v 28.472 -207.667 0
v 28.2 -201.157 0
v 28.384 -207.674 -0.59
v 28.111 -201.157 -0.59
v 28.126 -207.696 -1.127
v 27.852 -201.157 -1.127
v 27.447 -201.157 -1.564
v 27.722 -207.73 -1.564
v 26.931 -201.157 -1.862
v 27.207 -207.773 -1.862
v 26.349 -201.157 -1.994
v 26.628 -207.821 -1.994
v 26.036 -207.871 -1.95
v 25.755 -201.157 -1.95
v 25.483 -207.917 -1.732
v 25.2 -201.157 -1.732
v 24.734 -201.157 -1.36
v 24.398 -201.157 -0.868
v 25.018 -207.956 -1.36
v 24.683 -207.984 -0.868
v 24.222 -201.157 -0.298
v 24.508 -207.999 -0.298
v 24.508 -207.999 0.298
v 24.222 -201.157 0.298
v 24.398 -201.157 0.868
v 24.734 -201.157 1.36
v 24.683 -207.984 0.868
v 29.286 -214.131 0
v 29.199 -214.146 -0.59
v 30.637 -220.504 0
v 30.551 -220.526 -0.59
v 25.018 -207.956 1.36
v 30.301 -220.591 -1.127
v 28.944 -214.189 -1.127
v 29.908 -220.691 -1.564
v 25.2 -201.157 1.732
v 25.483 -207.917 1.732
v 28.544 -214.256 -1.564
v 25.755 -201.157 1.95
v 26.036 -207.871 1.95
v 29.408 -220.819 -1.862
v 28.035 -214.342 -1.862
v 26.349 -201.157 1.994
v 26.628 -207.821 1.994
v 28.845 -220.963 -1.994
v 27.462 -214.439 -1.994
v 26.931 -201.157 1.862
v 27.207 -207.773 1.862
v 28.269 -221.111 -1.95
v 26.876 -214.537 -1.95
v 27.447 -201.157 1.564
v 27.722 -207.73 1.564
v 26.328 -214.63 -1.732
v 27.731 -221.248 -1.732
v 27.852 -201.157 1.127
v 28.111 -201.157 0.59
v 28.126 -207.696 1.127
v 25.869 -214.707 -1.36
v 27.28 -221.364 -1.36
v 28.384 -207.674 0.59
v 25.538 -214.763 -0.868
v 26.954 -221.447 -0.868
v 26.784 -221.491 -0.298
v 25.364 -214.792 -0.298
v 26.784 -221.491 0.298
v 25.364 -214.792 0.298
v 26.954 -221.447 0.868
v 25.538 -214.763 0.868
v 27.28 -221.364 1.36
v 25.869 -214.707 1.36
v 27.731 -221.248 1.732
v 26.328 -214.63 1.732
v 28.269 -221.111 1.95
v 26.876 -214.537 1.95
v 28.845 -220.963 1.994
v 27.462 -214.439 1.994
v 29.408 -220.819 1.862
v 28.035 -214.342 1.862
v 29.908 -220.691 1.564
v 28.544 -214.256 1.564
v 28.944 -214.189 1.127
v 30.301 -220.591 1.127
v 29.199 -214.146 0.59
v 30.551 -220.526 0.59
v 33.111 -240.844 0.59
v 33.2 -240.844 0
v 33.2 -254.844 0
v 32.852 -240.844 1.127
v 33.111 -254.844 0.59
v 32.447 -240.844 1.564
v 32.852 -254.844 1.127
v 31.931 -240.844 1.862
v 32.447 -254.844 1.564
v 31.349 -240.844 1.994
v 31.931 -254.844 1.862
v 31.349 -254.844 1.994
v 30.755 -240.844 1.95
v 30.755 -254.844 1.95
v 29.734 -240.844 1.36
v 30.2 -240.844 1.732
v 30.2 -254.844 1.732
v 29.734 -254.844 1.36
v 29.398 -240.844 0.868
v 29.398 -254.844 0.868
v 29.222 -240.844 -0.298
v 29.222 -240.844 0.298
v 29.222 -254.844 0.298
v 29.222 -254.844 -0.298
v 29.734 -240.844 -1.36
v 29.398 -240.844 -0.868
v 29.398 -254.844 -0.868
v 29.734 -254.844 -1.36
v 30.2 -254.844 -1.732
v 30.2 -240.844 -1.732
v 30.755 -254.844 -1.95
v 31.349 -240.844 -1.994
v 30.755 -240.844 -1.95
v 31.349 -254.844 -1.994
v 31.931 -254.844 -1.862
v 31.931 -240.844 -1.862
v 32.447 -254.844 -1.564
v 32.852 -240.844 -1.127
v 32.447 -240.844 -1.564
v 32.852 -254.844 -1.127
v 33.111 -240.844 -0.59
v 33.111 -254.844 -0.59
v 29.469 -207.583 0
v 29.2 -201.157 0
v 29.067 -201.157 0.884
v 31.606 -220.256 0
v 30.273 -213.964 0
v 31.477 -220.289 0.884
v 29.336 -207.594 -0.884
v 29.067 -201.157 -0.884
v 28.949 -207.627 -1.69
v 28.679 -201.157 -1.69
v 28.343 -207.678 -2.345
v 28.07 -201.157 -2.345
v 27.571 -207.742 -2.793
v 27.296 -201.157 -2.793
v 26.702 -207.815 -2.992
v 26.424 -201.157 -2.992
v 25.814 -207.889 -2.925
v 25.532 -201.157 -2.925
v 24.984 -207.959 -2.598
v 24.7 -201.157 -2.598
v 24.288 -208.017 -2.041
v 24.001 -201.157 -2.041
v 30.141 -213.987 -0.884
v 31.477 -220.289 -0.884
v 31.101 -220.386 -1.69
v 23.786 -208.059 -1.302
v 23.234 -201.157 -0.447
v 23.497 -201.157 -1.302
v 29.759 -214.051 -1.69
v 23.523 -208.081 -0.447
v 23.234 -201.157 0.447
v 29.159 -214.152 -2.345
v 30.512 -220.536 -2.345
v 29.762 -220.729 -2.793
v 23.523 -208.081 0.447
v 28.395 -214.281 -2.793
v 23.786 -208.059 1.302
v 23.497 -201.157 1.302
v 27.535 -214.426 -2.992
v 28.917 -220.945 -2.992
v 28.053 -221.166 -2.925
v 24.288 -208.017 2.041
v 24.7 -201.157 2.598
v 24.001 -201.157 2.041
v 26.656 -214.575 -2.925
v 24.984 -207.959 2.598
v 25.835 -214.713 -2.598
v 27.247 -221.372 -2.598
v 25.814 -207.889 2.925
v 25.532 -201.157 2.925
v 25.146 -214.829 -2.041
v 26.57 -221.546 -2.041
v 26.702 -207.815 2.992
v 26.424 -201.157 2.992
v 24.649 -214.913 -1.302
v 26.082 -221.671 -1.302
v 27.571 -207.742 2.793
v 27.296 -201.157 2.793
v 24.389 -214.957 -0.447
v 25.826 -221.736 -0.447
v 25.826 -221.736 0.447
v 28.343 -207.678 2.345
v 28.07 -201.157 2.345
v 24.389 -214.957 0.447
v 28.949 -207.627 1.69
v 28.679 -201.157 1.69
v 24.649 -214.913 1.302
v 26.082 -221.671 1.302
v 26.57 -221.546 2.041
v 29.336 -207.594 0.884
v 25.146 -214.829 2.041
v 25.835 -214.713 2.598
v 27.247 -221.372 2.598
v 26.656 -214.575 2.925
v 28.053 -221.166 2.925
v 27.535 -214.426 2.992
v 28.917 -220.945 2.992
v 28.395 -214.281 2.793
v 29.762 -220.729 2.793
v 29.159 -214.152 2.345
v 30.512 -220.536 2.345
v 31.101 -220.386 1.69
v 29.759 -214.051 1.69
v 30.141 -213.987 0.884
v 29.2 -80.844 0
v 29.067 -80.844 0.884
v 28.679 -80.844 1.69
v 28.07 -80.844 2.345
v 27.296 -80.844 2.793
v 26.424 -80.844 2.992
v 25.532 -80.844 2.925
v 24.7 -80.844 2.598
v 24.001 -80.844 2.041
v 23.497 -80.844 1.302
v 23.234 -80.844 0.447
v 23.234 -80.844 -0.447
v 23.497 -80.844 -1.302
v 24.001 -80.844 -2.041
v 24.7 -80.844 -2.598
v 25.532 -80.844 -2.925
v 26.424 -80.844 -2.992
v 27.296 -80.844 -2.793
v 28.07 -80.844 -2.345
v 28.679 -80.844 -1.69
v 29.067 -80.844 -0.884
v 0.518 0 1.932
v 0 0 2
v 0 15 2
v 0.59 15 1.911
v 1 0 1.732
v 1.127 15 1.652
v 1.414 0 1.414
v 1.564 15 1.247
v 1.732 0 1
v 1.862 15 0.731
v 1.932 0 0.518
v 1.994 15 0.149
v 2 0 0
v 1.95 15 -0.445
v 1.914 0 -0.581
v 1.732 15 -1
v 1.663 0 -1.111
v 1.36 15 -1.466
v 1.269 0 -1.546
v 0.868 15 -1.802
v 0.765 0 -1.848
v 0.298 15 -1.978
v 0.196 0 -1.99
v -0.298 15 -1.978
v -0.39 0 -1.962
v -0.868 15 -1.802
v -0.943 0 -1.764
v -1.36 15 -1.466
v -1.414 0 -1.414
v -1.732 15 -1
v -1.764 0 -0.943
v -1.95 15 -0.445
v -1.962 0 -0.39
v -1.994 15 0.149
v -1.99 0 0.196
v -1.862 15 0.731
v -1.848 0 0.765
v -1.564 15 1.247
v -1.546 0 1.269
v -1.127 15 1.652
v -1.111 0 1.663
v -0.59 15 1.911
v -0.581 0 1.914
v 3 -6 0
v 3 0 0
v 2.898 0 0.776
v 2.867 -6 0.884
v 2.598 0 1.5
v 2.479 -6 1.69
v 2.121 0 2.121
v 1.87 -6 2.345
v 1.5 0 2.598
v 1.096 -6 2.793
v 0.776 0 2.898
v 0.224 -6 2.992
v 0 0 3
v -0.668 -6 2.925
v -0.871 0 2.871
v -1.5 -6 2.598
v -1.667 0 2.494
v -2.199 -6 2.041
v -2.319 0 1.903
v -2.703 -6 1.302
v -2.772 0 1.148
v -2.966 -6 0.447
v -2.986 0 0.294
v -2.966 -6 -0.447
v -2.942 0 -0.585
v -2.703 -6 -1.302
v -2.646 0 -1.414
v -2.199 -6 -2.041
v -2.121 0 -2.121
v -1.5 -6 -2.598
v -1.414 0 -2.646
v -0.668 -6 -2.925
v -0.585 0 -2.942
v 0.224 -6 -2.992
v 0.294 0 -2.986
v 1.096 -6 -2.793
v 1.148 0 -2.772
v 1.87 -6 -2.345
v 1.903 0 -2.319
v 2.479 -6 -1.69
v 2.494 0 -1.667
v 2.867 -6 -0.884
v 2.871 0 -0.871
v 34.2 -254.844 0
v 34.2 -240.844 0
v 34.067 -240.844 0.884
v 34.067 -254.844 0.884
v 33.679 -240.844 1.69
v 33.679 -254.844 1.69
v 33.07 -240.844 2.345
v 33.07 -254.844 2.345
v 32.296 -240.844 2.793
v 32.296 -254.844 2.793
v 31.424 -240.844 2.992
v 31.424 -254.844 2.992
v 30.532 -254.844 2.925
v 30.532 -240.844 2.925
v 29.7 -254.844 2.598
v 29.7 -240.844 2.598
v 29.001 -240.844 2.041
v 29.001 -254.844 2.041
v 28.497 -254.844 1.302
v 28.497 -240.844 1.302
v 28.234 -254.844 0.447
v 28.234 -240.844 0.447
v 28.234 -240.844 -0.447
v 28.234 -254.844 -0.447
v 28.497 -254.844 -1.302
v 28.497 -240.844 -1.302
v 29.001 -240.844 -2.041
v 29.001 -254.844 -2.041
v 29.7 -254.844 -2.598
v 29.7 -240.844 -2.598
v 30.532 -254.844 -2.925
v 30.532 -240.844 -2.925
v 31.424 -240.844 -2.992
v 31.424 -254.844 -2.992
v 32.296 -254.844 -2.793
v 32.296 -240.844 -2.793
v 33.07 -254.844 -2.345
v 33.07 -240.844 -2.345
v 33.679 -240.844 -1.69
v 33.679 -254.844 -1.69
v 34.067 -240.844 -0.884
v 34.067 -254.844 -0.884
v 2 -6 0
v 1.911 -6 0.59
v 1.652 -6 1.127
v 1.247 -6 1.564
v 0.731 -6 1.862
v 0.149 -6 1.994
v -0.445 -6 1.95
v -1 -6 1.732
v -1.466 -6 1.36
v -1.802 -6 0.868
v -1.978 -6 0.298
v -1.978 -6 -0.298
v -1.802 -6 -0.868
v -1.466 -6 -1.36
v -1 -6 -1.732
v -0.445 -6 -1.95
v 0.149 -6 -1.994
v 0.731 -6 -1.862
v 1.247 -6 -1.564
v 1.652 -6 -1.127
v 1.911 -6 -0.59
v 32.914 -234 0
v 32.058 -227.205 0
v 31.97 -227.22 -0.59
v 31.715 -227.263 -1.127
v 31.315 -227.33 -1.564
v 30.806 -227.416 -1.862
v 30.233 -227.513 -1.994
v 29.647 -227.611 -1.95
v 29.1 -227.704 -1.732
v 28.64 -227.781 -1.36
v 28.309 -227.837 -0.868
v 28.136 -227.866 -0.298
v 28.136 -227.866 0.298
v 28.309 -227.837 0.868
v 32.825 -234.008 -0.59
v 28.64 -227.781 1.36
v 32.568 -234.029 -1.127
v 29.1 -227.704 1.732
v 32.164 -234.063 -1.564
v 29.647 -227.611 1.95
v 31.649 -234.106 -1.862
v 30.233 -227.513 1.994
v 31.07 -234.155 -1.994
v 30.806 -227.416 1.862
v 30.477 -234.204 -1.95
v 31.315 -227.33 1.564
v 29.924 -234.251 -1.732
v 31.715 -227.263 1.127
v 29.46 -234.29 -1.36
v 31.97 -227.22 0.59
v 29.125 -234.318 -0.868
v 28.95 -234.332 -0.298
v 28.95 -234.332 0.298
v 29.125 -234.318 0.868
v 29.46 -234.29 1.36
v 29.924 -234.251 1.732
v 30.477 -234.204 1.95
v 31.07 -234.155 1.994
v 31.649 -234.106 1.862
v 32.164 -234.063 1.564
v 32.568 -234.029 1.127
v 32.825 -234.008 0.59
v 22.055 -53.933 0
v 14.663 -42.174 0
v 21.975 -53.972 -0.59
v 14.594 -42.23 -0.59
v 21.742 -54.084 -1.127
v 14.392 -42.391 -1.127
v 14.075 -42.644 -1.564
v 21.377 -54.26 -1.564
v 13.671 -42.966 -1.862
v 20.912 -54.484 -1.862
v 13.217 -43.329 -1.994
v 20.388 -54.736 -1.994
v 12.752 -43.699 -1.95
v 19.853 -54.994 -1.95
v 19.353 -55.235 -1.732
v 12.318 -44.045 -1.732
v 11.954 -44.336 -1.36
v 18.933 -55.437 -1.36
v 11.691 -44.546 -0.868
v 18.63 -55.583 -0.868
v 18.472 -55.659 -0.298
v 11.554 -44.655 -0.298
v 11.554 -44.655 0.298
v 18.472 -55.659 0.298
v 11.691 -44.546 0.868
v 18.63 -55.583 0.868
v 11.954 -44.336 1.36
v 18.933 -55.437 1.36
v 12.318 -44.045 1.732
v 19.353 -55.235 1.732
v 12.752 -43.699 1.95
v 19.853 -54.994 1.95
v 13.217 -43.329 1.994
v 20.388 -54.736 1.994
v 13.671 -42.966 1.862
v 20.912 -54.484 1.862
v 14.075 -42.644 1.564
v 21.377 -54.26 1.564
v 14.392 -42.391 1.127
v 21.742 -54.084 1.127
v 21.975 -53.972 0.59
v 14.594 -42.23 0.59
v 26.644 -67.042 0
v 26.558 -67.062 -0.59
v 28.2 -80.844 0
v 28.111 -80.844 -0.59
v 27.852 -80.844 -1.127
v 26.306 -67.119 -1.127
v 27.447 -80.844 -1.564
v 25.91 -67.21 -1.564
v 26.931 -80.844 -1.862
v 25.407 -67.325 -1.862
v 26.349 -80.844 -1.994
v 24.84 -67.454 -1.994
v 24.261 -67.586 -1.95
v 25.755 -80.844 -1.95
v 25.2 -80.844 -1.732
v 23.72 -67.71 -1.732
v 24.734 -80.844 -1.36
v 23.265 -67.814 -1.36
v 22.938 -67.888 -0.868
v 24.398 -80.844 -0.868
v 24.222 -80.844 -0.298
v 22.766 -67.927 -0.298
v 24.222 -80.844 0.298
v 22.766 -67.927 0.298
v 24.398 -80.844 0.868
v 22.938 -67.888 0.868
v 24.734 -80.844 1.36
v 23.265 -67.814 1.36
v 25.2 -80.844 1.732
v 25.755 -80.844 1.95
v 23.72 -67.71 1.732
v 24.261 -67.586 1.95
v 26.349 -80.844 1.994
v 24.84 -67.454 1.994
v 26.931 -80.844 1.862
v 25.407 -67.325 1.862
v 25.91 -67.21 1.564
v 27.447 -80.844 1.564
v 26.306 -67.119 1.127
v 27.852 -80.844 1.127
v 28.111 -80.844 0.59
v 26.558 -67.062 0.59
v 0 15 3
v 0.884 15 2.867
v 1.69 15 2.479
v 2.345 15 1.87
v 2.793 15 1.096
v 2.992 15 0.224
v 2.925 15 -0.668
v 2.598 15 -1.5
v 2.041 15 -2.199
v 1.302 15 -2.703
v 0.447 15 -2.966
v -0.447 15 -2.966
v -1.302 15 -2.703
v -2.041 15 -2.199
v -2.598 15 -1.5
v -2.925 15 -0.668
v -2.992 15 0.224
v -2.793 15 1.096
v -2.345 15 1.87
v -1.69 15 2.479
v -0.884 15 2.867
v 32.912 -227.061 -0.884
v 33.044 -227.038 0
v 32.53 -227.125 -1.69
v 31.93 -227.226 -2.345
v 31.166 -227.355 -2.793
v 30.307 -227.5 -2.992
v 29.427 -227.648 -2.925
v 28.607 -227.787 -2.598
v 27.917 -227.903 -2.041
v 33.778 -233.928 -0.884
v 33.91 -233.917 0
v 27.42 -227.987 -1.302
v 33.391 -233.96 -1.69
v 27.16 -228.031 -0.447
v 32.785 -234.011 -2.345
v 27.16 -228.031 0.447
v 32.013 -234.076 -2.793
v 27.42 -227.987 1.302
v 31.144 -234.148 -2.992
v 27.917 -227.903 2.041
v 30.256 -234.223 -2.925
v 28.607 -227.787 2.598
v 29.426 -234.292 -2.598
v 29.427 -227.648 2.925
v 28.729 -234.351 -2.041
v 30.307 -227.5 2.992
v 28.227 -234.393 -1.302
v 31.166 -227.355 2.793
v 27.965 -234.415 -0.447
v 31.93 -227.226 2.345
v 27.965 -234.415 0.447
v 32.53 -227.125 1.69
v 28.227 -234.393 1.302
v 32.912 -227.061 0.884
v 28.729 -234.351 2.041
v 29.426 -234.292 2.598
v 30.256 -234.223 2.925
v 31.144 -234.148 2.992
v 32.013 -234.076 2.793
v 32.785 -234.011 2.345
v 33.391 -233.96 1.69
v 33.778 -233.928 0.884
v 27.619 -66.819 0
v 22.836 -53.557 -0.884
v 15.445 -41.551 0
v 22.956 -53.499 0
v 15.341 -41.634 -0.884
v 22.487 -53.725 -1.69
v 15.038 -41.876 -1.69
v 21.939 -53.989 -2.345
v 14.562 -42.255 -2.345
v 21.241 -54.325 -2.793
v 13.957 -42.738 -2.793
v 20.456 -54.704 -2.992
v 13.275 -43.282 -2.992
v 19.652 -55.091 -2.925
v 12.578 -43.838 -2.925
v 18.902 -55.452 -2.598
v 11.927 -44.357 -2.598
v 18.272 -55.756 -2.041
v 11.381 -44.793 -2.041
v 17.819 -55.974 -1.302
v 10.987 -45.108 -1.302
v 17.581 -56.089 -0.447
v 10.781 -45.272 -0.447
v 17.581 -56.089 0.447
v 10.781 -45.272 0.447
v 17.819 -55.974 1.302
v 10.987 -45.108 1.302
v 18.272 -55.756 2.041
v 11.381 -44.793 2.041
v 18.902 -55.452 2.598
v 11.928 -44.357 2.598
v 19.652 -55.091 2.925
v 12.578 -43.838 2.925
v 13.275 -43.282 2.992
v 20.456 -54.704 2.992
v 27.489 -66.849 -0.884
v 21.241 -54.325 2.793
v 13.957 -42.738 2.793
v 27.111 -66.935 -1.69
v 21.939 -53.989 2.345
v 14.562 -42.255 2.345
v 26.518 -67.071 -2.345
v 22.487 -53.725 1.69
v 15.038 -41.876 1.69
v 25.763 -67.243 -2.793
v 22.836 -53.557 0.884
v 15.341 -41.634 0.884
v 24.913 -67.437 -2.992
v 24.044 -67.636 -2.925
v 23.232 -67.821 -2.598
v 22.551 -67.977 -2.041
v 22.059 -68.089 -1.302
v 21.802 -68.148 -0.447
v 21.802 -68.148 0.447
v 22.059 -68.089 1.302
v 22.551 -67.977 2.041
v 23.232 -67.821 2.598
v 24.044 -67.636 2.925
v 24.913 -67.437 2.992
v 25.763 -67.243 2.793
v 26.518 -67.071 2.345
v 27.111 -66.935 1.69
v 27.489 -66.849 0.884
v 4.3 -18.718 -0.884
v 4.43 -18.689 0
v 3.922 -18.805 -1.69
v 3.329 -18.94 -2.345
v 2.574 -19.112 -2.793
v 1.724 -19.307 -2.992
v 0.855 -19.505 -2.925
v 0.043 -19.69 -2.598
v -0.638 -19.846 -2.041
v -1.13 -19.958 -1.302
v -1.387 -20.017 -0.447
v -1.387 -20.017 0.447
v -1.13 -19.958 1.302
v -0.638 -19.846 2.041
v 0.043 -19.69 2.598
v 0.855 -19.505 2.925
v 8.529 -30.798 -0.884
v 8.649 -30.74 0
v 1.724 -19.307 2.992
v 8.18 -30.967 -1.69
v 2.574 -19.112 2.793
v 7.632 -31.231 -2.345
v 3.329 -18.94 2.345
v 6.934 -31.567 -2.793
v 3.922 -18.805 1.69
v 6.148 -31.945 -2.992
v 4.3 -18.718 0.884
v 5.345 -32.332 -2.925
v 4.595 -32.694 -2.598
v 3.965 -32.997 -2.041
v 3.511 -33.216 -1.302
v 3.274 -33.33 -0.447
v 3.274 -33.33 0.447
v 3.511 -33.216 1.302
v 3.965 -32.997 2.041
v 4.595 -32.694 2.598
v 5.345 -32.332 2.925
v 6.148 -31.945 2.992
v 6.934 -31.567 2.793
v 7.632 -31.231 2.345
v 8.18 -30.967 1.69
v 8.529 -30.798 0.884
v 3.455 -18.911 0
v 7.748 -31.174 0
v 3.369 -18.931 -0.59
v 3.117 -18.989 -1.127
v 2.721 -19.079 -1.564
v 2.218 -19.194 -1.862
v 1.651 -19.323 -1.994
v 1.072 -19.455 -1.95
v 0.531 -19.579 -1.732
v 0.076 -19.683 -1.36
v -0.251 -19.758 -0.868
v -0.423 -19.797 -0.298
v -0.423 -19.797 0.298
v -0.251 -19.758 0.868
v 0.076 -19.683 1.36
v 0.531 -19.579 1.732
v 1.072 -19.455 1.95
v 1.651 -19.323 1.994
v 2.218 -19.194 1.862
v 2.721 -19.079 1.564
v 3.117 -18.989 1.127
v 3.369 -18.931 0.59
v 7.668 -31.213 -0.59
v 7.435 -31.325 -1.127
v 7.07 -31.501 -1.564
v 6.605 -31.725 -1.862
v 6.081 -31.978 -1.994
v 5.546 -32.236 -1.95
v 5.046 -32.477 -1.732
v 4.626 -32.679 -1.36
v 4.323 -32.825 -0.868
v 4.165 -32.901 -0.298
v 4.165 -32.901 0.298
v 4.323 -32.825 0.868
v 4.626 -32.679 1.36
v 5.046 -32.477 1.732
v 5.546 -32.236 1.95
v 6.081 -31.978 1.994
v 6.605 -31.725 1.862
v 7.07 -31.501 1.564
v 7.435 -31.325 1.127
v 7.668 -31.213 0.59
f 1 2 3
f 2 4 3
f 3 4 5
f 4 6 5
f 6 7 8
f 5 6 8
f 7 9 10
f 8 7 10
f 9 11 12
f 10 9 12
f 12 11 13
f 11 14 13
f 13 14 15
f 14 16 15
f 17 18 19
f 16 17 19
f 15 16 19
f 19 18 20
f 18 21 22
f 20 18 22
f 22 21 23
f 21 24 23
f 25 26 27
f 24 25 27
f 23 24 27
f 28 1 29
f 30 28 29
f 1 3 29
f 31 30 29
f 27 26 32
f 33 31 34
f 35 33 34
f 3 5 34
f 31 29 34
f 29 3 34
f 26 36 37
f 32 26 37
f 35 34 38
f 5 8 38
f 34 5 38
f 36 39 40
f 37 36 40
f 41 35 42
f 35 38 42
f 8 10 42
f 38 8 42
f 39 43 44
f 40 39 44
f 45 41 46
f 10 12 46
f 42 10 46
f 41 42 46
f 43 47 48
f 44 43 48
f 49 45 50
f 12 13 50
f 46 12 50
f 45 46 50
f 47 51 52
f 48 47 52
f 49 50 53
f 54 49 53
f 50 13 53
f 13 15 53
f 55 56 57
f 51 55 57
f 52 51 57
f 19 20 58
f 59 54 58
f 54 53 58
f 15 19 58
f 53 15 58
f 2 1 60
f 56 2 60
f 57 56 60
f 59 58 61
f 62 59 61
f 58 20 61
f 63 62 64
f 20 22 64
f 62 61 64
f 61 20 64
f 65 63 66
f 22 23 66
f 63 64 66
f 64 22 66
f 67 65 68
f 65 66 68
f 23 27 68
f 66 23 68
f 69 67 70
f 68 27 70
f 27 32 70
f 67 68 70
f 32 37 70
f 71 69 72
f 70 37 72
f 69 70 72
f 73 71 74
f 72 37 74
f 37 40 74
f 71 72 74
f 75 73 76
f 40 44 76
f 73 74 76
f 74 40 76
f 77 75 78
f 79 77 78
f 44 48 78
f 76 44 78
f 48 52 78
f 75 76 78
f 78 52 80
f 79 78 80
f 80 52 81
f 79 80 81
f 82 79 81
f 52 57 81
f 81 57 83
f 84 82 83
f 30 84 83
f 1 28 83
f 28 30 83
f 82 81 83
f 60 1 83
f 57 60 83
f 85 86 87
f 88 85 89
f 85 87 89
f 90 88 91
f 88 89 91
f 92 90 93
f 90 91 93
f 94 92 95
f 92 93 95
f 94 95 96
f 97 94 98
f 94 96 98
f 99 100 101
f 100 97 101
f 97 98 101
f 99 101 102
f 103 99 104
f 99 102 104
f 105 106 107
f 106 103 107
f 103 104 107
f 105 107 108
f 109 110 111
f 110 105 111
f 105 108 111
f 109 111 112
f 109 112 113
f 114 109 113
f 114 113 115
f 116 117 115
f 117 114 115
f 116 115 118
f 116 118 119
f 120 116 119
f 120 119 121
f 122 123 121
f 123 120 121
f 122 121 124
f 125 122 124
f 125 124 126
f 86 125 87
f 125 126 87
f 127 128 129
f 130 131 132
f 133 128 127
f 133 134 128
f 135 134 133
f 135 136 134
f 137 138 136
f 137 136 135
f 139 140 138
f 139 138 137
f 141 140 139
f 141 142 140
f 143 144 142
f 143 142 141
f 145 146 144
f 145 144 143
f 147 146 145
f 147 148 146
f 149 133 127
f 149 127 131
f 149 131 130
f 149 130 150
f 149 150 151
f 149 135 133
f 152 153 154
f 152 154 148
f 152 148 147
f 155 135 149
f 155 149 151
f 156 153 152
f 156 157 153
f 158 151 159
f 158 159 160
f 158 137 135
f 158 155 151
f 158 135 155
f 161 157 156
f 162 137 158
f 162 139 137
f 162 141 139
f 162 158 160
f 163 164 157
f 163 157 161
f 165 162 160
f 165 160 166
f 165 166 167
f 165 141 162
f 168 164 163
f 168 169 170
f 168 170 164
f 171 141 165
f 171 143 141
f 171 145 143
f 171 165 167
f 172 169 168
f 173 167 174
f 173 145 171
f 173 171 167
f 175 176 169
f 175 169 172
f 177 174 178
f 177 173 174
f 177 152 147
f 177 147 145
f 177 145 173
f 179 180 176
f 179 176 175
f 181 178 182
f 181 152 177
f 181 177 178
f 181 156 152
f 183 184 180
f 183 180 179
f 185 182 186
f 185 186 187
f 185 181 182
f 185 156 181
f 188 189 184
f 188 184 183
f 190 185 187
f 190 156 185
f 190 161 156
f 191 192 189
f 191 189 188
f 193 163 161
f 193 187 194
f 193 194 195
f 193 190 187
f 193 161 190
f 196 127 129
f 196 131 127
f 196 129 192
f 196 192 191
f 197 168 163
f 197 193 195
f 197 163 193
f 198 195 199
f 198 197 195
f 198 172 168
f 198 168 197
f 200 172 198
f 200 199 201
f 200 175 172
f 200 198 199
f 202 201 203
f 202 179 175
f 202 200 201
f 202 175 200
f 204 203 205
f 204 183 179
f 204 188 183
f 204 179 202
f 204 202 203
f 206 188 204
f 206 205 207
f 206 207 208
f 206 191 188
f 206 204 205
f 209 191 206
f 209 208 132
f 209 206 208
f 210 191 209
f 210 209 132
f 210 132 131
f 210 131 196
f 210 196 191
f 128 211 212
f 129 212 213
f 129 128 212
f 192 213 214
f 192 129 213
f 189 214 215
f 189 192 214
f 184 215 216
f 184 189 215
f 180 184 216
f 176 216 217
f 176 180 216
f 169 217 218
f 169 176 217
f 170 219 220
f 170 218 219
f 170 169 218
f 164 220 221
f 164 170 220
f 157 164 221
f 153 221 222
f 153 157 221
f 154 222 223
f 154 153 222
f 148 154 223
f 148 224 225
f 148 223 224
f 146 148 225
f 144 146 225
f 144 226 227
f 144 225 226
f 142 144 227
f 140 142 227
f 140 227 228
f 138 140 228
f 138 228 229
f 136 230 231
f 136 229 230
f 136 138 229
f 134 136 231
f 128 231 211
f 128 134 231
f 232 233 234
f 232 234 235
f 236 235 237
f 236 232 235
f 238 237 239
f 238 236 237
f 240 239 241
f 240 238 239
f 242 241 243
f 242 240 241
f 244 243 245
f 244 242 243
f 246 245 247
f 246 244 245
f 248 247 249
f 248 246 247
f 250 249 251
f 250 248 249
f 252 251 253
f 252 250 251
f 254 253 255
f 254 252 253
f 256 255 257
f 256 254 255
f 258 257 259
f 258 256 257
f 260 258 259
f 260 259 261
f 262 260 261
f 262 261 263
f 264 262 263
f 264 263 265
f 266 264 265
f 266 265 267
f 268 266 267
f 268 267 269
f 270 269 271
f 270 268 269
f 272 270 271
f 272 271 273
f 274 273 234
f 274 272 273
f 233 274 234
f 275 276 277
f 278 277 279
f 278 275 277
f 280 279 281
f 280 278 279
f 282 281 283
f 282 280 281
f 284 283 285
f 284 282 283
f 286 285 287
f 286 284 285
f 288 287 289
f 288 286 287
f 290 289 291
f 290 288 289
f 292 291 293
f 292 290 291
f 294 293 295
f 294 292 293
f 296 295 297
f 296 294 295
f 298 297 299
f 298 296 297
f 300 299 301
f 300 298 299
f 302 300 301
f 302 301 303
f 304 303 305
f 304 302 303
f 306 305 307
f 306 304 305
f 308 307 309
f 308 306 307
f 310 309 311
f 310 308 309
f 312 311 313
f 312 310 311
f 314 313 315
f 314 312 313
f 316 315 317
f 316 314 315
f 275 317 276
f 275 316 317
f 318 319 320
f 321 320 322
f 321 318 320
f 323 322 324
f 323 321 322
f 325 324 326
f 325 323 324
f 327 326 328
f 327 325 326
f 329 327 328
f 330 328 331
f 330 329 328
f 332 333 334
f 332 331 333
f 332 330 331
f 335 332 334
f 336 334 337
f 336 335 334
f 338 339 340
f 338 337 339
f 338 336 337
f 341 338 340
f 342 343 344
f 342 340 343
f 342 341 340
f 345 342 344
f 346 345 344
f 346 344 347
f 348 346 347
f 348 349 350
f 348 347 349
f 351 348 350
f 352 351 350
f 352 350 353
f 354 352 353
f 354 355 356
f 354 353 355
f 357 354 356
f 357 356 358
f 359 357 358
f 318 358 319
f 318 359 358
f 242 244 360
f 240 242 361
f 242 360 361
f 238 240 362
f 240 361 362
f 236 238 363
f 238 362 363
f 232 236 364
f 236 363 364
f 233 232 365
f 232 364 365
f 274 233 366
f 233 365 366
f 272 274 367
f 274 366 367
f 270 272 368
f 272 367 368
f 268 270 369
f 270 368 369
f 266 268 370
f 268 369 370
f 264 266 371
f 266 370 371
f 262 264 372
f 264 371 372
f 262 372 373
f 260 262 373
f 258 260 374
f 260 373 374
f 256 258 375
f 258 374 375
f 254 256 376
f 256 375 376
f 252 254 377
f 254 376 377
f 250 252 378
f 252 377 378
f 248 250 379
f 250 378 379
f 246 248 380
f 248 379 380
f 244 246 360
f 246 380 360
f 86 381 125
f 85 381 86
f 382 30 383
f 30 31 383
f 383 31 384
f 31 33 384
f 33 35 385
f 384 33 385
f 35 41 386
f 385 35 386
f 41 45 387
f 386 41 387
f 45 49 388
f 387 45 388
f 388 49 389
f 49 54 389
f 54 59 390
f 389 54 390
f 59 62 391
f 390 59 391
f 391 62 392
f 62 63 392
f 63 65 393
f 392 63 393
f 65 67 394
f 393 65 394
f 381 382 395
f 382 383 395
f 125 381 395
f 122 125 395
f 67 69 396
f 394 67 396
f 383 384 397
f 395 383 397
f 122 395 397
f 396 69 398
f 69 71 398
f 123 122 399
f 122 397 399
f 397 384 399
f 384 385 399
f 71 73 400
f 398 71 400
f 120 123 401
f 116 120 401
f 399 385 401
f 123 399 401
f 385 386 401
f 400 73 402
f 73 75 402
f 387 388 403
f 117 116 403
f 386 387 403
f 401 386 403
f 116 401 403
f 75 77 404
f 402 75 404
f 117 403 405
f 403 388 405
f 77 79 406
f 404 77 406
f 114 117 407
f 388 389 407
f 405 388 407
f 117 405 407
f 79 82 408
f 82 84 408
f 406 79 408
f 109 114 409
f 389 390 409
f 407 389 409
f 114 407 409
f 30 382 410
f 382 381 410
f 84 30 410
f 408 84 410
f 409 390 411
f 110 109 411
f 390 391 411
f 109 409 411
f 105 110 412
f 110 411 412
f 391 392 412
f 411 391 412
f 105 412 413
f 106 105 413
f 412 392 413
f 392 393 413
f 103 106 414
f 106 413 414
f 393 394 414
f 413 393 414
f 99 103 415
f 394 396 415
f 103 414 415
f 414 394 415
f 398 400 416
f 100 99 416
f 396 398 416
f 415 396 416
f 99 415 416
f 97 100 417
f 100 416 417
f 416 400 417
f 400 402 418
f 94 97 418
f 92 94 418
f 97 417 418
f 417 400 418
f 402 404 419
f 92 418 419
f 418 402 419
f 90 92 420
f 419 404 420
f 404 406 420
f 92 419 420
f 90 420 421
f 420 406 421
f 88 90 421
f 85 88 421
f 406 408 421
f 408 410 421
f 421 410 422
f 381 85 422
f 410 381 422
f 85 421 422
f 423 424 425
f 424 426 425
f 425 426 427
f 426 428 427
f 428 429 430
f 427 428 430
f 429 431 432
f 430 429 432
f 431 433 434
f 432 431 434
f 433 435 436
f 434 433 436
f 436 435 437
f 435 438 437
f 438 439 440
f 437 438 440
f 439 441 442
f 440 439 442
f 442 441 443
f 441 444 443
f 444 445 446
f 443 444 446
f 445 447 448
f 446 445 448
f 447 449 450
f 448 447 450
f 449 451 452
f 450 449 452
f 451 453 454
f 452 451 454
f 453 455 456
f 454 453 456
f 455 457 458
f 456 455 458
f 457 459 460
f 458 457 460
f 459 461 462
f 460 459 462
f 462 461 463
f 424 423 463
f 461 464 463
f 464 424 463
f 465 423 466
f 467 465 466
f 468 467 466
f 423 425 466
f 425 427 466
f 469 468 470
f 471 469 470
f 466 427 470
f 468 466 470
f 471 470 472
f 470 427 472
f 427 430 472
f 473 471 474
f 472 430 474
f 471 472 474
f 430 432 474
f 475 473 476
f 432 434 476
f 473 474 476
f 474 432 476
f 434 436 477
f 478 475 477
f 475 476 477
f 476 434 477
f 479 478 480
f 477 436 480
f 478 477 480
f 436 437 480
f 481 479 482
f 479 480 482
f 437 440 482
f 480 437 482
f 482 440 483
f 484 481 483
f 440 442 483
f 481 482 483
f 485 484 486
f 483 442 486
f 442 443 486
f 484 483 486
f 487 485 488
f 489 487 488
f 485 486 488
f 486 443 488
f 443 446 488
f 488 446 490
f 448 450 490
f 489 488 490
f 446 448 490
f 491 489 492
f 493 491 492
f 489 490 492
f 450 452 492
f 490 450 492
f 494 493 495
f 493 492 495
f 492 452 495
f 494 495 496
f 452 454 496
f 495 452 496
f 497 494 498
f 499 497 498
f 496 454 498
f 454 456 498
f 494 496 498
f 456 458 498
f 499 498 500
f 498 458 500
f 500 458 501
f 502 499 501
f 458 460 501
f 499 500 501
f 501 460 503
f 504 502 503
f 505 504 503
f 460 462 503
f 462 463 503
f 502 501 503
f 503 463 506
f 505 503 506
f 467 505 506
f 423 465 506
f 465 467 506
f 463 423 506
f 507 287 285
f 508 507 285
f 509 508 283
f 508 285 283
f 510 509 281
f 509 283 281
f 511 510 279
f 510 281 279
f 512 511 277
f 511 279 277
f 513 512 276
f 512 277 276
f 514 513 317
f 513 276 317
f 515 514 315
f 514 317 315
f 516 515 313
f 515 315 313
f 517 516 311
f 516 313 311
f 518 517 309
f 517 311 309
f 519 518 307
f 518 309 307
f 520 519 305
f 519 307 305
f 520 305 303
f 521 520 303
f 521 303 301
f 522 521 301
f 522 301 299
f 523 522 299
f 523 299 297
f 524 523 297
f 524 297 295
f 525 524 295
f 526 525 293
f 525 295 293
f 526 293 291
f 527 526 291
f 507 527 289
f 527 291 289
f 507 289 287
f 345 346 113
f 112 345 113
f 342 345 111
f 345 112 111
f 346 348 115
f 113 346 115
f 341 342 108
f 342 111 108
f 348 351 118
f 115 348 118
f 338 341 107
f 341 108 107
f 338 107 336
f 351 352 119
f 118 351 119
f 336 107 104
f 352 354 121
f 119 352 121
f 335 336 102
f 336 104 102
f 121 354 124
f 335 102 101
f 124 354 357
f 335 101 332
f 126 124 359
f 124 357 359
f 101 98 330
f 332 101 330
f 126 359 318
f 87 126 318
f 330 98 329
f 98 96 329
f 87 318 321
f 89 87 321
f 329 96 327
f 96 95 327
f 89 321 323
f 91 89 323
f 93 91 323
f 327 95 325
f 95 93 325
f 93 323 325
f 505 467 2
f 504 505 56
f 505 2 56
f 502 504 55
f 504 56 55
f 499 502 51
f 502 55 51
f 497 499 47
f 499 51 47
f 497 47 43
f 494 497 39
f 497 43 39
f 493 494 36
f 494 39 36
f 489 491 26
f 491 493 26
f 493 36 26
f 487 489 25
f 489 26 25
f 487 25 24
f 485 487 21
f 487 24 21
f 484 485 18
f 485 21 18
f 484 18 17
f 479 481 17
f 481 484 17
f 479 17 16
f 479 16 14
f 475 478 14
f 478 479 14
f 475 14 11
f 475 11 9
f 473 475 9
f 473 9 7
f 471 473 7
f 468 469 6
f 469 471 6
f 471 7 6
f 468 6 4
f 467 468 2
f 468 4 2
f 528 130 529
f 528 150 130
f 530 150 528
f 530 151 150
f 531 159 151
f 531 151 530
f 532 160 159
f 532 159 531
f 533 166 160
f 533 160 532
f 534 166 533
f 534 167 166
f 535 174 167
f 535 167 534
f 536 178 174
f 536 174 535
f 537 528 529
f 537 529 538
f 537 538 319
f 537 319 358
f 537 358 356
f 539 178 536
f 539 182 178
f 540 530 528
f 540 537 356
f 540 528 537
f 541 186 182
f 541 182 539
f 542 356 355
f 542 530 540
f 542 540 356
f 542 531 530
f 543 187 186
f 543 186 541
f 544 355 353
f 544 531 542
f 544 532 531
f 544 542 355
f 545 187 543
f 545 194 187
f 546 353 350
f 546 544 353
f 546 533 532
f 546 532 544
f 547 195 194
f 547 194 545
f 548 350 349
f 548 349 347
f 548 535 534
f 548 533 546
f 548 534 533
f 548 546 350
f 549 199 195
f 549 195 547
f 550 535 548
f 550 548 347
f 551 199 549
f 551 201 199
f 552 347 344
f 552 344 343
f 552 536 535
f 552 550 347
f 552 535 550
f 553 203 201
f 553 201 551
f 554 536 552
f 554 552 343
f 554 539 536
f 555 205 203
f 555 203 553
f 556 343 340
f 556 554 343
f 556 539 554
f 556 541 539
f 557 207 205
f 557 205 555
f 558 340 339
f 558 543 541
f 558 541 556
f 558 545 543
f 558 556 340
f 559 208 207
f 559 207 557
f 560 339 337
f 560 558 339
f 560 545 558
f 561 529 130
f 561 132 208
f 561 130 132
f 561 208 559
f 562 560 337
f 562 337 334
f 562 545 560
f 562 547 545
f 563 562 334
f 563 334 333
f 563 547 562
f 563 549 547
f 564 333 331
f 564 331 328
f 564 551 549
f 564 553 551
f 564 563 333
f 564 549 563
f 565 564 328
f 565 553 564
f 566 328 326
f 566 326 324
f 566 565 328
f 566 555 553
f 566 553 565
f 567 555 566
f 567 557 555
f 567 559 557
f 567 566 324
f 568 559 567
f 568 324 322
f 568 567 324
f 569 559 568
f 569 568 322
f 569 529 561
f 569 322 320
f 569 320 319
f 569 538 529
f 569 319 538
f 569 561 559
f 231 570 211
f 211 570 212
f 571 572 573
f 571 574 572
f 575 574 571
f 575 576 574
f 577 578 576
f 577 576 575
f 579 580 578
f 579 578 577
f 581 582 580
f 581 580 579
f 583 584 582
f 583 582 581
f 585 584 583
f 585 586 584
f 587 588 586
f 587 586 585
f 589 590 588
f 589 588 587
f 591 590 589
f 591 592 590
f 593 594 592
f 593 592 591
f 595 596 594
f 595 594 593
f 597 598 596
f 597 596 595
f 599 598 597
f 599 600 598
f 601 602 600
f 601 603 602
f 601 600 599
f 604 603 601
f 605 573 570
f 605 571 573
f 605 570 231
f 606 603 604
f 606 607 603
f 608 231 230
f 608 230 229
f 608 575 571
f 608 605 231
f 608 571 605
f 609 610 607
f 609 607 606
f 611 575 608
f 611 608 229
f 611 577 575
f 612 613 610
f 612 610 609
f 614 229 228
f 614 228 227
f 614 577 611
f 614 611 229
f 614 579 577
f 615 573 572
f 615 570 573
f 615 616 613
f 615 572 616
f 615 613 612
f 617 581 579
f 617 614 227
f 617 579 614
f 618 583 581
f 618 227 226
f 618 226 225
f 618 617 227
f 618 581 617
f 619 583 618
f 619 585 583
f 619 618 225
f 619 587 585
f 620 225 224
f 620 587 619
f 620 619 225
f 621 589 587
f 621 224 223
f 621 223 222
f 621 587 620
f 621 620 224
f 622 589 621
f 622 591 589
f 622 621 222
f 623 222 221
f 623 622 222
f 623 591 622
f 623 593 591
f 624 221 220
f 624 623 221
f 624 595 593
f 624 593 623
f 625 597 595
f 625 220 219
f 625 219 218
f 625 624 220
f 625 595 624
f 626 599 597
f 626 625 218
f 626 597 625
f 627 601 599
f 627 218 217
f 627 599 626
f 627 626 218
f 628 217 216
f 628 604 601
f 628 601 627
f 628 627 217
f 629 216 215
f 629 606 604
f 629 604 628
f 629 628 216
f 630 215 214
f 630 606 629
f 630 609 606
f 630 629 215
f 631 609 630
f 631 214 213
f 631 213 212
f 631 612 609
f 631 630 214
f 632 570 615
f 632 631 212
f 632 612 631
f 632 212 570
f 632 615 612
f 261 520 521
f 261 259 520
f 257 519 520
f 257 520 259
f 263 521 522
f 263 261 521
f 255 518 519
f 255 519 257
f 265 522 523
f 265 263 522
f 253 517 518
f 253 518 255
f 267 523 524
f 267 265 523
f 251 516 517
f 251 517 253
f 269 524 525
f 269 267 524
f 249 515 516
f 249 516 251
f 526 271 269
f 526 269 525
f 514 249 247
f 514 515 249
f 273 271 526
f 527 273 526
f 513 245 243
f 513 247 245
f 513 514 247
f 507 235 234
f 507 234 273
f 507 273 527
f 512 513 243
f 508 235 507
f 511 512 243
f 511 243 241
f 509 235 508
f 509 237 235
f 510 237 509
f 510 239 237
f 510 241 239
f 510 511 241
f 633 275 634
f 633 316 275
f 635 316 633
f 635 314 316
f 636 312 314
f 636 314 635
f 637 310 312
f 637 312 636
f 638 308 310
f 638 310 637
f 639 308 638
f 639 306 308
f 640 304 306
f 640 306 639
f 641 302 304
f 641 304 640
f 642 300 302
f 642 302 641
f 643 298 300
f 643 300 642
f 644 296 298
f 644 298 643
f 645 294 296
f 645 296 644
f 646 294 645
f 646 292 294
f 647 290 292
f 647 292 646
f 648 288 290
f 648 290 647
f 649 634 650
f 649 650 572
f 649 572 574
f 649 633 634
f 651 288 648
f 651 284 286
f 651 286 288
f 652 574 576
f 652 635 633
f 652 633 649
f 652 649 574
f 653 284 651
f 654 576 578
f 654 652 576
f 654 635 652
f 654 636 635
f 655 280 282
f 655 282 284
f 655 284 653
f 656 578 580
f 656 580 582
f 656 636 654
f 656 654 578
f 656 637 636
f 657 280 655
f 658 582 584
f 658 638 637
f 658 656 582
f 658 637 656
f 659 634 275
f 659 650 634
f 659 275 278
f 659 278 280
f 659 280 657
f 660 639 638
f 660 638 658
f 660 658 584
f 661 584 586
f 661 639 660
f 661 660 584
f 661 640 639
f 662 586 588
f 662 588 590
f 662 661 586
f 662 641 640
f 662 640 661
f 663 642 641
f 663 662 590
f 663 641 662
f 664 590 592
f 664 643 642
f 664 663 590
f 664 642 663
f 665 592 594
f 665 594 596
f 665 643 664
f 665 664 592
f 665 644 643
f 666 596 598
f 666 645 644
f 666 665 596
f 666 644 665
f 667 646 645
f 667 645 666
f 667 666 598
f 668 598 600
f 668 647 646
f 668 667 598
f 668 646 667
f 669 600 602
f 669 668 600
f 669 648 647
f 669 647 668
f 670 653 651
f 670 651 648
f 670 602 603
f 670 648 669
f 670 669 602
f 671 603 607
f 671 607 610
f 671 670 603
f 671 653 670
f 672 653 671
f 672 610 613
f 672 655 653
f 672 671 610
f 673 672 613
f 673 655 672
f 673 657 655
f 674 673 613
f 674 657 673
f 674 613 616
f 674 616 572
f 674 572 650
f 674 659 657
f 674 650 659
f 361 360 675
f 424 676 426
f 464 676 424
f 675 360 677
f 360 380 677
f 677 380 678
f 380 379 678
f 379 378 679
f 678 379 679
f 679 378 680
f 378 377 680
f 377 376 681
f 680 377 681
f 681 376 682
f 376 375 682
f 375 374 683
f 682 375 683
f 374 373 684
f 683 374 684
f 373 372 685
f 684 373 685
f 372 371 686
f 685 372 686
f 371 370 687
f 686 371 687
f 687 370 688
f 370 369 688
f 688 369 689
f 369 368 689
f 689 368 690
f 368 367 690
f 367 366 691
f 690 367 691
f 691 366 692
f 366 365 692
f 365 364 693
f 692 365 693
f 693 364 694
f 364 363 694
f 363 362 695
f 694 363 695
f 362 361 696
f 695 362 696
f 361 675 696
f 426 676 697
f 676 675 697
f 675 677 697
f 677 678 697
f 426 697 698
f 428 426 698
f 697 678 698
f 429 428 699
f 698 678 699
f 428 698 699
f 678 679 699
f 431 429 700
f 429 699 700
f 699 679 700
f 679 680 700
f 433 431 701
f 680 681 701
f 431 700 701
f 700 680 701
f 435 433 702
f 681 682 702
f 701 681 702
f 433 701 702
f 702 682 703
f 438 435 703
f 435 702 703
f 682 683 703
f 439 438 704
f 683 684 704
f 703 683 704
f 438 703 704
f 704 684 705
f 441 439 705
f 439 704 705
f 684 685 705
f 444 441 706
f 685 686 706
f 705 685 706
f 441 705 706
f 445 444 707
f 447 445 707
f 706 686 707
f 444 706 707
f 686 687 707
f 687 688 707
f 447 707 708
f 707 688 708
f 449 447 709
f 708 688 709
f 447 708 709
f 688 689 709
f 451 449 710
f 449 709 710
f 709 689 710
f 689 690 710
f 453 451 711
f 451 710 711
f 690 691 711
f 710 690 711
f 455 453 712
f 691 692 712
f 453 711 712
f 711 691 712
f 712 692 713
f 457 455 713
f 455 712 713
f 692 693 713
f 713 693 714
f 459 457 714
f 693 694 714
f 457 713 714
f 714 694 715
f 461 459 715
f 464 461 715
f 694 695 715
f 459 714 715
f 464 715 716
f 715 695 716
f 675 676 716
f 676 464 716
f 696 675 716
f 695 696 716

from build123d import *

# Parameters (mm, degrees)
SKETCH_1_R      = 3
SKETCH_1_R_2    = 2
EXTRUDE_1_DEPTH = 15
SKETCH_1_2_R    = 3
SKETCH_1_2_R_2  = 2


with BuildPart() as part:
    # Эскиз1 → Бобышка-Вытянуть1 (new body)
    with BuildSketch(Plane(origin=(0, 0, 0), x_dir=(1, 0, 0), z_dir=(0, 1, 0))):
        Circle(SKETCH_1_R)
        Circle(SKETCH_1_R_2, mode=Mode.SUBTRACT)
    extrude(amount=EXTRUDE_1_DEPTH)

    # По траектории1: sweep along a path in Sketch 296
    with BuildLine(Plane.XY) as sweep_1_path:
        Line((0, 0), (0, -6))
        ThreePointArc((0, -6), (3.369619461, -25.824227602), (13.1, -43.421785099))
        ThreePointArc((13.1, -43.421785099), (22.830380539, -61.019342597), (26.2, -80.843570198))
        Line((26.2, -80.843570198), (26.2, -201.157300532))
        ThreePointArc((26.2, -201.157300532), (26.827460668, -211.157300532), (28.7, -221.000435365))
        ThreePointArc((28.7, -221.000435365), (30.572539332, -230.843570198), (31.2, -240.843570198))
        Line((31.2, -240.843570198), (31.2, -254.843570198))
    # Эскиз1<2> → По траектории1 (sweep)
    with BuildSketch(Plane(origin=(0, 0, 0), x_dir=(1, 0, 0), z_dir=(0, 1, 0))):
        Circle(SKETCH_1_2_R)
        Circle(SKETCH_1_2_R_2, mode=Mode.SUBTRACT)
    sweep(path=sweep_1_path.line)


solid = part.part
